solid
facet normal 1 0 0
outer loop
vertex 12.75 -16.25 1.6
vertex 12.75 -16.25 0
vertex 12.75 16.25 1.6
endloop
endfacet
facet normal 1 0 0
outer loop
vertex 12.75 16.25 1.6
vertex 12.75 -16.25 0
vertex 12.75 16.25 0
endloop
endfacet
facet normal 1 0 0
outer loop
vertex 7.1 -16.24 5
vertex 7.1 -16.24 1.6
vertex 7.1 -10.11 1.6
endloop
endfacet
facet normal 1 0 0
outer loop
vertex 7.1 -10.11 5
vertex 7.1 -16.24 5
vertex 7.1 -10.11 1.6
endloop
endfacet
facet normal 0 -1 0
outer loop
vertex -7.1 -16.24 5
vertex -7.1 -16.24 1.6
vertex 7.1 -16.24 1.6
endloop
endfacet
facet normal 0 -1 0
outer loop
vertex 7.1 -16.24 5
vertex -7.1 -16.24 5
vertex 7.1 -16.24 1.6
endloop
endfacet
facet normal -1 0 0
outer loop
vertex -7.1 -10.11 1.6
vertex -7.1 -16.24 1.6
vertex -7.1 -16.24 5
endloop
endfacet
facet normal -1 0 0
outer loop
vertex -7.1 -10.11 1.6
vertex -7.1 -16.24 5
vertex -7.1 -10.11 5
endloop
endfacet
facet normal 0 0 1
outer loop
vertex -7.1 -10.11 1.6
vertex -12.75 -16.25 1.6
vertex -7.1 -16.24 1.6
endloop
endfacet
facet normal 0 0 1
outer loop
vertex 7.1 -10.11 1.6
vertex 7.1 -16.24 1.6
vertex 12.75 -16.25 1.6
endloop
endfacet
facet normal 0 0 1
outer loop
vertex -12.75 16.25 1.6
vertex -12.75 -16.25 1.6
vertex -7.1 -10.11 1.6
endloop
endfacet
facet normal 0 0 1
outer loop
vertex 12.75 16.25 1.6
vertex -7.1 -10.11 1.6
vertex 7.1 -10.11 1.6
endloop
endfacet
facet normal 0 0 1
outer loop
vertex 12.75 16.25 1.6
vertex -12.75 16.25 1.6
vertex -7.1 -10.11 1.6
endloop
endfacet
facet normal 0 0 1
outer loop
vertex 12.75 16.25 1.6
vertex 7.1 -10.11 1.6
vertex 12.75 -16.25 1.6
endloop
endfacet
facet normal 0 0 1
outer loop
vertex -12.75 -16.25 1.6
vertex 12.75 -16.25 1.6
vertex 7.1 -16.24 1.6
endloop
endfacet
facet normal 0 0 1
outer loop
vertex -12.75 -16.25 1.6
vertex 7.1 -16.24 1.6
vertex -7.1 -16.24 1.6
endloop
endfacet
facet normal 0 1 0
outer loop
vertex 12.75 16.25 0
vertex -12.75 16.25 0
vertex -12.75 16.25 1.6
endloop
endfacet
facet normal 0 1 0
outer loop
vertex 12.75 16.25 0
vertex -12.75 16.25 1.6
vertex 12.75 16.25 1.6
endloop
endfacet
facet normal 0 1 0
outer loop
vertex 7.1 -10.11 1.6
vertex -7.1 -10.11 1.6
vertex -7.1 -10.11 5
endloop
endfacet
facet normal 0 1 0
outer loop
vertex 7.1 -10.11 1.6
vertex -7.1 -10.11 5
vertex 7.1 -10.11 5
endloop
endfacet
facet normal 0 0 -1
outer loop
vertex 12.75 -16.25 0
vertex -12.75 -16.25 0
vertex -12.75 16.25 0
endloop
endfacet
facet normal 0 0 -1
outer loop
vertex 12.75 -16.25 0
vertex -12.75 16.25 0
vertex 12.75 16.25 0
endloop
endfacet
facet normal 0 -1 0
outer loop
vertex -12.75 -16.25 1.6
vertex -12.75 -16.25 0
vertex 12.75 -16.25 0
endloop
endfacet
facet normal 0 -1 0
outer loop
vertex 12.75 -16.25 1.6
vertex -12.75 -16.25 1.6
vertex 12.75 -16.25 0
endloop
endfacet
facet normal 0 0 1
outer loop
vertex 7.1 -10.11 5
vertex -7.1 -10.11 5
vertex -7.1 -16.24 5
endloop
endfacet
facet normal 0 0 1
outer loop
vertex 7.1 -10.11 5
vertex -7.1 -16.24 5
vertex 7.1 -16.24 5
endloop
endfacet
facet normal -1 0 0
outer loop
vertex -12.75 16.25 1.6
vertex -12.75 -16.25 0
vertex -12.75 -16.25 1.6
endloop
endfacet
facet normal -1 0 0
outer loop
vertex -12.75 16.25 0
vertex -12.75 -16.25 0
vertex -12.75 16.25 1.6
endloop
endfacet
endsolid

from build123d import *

# Parameters (mm, degrees)
SKETCH_1_W      = 25.5
SKETCH_1_H      = 32.5
EXTRUDE_1_DEPTH = 1.6
SKETCH_2_W      = 14.2
SKETCH_2_H      = 6.13
EXTRUDE_3_DEPTH = 5


with BuildPart() as part:
    # 草图1 → 凸台-拉伸1 (new body)
    with BuildSketch(Plane.XY):
        Rectangle(SKETCH_1_W, SKETCH_1_H)
    extrude(amount=EXTRUDE_1_DEPTH)

    # 草图2 → 凸台-拉伸3 (add)
    with BuildSketch(Plane.XY):
        with Locations((0, -13.175)):
            Rectangle(SKETCH_2_W, SKETCH_2_H)
    extrude(amount=EXTRUDE_3_DEPTH)


solid = part.part
